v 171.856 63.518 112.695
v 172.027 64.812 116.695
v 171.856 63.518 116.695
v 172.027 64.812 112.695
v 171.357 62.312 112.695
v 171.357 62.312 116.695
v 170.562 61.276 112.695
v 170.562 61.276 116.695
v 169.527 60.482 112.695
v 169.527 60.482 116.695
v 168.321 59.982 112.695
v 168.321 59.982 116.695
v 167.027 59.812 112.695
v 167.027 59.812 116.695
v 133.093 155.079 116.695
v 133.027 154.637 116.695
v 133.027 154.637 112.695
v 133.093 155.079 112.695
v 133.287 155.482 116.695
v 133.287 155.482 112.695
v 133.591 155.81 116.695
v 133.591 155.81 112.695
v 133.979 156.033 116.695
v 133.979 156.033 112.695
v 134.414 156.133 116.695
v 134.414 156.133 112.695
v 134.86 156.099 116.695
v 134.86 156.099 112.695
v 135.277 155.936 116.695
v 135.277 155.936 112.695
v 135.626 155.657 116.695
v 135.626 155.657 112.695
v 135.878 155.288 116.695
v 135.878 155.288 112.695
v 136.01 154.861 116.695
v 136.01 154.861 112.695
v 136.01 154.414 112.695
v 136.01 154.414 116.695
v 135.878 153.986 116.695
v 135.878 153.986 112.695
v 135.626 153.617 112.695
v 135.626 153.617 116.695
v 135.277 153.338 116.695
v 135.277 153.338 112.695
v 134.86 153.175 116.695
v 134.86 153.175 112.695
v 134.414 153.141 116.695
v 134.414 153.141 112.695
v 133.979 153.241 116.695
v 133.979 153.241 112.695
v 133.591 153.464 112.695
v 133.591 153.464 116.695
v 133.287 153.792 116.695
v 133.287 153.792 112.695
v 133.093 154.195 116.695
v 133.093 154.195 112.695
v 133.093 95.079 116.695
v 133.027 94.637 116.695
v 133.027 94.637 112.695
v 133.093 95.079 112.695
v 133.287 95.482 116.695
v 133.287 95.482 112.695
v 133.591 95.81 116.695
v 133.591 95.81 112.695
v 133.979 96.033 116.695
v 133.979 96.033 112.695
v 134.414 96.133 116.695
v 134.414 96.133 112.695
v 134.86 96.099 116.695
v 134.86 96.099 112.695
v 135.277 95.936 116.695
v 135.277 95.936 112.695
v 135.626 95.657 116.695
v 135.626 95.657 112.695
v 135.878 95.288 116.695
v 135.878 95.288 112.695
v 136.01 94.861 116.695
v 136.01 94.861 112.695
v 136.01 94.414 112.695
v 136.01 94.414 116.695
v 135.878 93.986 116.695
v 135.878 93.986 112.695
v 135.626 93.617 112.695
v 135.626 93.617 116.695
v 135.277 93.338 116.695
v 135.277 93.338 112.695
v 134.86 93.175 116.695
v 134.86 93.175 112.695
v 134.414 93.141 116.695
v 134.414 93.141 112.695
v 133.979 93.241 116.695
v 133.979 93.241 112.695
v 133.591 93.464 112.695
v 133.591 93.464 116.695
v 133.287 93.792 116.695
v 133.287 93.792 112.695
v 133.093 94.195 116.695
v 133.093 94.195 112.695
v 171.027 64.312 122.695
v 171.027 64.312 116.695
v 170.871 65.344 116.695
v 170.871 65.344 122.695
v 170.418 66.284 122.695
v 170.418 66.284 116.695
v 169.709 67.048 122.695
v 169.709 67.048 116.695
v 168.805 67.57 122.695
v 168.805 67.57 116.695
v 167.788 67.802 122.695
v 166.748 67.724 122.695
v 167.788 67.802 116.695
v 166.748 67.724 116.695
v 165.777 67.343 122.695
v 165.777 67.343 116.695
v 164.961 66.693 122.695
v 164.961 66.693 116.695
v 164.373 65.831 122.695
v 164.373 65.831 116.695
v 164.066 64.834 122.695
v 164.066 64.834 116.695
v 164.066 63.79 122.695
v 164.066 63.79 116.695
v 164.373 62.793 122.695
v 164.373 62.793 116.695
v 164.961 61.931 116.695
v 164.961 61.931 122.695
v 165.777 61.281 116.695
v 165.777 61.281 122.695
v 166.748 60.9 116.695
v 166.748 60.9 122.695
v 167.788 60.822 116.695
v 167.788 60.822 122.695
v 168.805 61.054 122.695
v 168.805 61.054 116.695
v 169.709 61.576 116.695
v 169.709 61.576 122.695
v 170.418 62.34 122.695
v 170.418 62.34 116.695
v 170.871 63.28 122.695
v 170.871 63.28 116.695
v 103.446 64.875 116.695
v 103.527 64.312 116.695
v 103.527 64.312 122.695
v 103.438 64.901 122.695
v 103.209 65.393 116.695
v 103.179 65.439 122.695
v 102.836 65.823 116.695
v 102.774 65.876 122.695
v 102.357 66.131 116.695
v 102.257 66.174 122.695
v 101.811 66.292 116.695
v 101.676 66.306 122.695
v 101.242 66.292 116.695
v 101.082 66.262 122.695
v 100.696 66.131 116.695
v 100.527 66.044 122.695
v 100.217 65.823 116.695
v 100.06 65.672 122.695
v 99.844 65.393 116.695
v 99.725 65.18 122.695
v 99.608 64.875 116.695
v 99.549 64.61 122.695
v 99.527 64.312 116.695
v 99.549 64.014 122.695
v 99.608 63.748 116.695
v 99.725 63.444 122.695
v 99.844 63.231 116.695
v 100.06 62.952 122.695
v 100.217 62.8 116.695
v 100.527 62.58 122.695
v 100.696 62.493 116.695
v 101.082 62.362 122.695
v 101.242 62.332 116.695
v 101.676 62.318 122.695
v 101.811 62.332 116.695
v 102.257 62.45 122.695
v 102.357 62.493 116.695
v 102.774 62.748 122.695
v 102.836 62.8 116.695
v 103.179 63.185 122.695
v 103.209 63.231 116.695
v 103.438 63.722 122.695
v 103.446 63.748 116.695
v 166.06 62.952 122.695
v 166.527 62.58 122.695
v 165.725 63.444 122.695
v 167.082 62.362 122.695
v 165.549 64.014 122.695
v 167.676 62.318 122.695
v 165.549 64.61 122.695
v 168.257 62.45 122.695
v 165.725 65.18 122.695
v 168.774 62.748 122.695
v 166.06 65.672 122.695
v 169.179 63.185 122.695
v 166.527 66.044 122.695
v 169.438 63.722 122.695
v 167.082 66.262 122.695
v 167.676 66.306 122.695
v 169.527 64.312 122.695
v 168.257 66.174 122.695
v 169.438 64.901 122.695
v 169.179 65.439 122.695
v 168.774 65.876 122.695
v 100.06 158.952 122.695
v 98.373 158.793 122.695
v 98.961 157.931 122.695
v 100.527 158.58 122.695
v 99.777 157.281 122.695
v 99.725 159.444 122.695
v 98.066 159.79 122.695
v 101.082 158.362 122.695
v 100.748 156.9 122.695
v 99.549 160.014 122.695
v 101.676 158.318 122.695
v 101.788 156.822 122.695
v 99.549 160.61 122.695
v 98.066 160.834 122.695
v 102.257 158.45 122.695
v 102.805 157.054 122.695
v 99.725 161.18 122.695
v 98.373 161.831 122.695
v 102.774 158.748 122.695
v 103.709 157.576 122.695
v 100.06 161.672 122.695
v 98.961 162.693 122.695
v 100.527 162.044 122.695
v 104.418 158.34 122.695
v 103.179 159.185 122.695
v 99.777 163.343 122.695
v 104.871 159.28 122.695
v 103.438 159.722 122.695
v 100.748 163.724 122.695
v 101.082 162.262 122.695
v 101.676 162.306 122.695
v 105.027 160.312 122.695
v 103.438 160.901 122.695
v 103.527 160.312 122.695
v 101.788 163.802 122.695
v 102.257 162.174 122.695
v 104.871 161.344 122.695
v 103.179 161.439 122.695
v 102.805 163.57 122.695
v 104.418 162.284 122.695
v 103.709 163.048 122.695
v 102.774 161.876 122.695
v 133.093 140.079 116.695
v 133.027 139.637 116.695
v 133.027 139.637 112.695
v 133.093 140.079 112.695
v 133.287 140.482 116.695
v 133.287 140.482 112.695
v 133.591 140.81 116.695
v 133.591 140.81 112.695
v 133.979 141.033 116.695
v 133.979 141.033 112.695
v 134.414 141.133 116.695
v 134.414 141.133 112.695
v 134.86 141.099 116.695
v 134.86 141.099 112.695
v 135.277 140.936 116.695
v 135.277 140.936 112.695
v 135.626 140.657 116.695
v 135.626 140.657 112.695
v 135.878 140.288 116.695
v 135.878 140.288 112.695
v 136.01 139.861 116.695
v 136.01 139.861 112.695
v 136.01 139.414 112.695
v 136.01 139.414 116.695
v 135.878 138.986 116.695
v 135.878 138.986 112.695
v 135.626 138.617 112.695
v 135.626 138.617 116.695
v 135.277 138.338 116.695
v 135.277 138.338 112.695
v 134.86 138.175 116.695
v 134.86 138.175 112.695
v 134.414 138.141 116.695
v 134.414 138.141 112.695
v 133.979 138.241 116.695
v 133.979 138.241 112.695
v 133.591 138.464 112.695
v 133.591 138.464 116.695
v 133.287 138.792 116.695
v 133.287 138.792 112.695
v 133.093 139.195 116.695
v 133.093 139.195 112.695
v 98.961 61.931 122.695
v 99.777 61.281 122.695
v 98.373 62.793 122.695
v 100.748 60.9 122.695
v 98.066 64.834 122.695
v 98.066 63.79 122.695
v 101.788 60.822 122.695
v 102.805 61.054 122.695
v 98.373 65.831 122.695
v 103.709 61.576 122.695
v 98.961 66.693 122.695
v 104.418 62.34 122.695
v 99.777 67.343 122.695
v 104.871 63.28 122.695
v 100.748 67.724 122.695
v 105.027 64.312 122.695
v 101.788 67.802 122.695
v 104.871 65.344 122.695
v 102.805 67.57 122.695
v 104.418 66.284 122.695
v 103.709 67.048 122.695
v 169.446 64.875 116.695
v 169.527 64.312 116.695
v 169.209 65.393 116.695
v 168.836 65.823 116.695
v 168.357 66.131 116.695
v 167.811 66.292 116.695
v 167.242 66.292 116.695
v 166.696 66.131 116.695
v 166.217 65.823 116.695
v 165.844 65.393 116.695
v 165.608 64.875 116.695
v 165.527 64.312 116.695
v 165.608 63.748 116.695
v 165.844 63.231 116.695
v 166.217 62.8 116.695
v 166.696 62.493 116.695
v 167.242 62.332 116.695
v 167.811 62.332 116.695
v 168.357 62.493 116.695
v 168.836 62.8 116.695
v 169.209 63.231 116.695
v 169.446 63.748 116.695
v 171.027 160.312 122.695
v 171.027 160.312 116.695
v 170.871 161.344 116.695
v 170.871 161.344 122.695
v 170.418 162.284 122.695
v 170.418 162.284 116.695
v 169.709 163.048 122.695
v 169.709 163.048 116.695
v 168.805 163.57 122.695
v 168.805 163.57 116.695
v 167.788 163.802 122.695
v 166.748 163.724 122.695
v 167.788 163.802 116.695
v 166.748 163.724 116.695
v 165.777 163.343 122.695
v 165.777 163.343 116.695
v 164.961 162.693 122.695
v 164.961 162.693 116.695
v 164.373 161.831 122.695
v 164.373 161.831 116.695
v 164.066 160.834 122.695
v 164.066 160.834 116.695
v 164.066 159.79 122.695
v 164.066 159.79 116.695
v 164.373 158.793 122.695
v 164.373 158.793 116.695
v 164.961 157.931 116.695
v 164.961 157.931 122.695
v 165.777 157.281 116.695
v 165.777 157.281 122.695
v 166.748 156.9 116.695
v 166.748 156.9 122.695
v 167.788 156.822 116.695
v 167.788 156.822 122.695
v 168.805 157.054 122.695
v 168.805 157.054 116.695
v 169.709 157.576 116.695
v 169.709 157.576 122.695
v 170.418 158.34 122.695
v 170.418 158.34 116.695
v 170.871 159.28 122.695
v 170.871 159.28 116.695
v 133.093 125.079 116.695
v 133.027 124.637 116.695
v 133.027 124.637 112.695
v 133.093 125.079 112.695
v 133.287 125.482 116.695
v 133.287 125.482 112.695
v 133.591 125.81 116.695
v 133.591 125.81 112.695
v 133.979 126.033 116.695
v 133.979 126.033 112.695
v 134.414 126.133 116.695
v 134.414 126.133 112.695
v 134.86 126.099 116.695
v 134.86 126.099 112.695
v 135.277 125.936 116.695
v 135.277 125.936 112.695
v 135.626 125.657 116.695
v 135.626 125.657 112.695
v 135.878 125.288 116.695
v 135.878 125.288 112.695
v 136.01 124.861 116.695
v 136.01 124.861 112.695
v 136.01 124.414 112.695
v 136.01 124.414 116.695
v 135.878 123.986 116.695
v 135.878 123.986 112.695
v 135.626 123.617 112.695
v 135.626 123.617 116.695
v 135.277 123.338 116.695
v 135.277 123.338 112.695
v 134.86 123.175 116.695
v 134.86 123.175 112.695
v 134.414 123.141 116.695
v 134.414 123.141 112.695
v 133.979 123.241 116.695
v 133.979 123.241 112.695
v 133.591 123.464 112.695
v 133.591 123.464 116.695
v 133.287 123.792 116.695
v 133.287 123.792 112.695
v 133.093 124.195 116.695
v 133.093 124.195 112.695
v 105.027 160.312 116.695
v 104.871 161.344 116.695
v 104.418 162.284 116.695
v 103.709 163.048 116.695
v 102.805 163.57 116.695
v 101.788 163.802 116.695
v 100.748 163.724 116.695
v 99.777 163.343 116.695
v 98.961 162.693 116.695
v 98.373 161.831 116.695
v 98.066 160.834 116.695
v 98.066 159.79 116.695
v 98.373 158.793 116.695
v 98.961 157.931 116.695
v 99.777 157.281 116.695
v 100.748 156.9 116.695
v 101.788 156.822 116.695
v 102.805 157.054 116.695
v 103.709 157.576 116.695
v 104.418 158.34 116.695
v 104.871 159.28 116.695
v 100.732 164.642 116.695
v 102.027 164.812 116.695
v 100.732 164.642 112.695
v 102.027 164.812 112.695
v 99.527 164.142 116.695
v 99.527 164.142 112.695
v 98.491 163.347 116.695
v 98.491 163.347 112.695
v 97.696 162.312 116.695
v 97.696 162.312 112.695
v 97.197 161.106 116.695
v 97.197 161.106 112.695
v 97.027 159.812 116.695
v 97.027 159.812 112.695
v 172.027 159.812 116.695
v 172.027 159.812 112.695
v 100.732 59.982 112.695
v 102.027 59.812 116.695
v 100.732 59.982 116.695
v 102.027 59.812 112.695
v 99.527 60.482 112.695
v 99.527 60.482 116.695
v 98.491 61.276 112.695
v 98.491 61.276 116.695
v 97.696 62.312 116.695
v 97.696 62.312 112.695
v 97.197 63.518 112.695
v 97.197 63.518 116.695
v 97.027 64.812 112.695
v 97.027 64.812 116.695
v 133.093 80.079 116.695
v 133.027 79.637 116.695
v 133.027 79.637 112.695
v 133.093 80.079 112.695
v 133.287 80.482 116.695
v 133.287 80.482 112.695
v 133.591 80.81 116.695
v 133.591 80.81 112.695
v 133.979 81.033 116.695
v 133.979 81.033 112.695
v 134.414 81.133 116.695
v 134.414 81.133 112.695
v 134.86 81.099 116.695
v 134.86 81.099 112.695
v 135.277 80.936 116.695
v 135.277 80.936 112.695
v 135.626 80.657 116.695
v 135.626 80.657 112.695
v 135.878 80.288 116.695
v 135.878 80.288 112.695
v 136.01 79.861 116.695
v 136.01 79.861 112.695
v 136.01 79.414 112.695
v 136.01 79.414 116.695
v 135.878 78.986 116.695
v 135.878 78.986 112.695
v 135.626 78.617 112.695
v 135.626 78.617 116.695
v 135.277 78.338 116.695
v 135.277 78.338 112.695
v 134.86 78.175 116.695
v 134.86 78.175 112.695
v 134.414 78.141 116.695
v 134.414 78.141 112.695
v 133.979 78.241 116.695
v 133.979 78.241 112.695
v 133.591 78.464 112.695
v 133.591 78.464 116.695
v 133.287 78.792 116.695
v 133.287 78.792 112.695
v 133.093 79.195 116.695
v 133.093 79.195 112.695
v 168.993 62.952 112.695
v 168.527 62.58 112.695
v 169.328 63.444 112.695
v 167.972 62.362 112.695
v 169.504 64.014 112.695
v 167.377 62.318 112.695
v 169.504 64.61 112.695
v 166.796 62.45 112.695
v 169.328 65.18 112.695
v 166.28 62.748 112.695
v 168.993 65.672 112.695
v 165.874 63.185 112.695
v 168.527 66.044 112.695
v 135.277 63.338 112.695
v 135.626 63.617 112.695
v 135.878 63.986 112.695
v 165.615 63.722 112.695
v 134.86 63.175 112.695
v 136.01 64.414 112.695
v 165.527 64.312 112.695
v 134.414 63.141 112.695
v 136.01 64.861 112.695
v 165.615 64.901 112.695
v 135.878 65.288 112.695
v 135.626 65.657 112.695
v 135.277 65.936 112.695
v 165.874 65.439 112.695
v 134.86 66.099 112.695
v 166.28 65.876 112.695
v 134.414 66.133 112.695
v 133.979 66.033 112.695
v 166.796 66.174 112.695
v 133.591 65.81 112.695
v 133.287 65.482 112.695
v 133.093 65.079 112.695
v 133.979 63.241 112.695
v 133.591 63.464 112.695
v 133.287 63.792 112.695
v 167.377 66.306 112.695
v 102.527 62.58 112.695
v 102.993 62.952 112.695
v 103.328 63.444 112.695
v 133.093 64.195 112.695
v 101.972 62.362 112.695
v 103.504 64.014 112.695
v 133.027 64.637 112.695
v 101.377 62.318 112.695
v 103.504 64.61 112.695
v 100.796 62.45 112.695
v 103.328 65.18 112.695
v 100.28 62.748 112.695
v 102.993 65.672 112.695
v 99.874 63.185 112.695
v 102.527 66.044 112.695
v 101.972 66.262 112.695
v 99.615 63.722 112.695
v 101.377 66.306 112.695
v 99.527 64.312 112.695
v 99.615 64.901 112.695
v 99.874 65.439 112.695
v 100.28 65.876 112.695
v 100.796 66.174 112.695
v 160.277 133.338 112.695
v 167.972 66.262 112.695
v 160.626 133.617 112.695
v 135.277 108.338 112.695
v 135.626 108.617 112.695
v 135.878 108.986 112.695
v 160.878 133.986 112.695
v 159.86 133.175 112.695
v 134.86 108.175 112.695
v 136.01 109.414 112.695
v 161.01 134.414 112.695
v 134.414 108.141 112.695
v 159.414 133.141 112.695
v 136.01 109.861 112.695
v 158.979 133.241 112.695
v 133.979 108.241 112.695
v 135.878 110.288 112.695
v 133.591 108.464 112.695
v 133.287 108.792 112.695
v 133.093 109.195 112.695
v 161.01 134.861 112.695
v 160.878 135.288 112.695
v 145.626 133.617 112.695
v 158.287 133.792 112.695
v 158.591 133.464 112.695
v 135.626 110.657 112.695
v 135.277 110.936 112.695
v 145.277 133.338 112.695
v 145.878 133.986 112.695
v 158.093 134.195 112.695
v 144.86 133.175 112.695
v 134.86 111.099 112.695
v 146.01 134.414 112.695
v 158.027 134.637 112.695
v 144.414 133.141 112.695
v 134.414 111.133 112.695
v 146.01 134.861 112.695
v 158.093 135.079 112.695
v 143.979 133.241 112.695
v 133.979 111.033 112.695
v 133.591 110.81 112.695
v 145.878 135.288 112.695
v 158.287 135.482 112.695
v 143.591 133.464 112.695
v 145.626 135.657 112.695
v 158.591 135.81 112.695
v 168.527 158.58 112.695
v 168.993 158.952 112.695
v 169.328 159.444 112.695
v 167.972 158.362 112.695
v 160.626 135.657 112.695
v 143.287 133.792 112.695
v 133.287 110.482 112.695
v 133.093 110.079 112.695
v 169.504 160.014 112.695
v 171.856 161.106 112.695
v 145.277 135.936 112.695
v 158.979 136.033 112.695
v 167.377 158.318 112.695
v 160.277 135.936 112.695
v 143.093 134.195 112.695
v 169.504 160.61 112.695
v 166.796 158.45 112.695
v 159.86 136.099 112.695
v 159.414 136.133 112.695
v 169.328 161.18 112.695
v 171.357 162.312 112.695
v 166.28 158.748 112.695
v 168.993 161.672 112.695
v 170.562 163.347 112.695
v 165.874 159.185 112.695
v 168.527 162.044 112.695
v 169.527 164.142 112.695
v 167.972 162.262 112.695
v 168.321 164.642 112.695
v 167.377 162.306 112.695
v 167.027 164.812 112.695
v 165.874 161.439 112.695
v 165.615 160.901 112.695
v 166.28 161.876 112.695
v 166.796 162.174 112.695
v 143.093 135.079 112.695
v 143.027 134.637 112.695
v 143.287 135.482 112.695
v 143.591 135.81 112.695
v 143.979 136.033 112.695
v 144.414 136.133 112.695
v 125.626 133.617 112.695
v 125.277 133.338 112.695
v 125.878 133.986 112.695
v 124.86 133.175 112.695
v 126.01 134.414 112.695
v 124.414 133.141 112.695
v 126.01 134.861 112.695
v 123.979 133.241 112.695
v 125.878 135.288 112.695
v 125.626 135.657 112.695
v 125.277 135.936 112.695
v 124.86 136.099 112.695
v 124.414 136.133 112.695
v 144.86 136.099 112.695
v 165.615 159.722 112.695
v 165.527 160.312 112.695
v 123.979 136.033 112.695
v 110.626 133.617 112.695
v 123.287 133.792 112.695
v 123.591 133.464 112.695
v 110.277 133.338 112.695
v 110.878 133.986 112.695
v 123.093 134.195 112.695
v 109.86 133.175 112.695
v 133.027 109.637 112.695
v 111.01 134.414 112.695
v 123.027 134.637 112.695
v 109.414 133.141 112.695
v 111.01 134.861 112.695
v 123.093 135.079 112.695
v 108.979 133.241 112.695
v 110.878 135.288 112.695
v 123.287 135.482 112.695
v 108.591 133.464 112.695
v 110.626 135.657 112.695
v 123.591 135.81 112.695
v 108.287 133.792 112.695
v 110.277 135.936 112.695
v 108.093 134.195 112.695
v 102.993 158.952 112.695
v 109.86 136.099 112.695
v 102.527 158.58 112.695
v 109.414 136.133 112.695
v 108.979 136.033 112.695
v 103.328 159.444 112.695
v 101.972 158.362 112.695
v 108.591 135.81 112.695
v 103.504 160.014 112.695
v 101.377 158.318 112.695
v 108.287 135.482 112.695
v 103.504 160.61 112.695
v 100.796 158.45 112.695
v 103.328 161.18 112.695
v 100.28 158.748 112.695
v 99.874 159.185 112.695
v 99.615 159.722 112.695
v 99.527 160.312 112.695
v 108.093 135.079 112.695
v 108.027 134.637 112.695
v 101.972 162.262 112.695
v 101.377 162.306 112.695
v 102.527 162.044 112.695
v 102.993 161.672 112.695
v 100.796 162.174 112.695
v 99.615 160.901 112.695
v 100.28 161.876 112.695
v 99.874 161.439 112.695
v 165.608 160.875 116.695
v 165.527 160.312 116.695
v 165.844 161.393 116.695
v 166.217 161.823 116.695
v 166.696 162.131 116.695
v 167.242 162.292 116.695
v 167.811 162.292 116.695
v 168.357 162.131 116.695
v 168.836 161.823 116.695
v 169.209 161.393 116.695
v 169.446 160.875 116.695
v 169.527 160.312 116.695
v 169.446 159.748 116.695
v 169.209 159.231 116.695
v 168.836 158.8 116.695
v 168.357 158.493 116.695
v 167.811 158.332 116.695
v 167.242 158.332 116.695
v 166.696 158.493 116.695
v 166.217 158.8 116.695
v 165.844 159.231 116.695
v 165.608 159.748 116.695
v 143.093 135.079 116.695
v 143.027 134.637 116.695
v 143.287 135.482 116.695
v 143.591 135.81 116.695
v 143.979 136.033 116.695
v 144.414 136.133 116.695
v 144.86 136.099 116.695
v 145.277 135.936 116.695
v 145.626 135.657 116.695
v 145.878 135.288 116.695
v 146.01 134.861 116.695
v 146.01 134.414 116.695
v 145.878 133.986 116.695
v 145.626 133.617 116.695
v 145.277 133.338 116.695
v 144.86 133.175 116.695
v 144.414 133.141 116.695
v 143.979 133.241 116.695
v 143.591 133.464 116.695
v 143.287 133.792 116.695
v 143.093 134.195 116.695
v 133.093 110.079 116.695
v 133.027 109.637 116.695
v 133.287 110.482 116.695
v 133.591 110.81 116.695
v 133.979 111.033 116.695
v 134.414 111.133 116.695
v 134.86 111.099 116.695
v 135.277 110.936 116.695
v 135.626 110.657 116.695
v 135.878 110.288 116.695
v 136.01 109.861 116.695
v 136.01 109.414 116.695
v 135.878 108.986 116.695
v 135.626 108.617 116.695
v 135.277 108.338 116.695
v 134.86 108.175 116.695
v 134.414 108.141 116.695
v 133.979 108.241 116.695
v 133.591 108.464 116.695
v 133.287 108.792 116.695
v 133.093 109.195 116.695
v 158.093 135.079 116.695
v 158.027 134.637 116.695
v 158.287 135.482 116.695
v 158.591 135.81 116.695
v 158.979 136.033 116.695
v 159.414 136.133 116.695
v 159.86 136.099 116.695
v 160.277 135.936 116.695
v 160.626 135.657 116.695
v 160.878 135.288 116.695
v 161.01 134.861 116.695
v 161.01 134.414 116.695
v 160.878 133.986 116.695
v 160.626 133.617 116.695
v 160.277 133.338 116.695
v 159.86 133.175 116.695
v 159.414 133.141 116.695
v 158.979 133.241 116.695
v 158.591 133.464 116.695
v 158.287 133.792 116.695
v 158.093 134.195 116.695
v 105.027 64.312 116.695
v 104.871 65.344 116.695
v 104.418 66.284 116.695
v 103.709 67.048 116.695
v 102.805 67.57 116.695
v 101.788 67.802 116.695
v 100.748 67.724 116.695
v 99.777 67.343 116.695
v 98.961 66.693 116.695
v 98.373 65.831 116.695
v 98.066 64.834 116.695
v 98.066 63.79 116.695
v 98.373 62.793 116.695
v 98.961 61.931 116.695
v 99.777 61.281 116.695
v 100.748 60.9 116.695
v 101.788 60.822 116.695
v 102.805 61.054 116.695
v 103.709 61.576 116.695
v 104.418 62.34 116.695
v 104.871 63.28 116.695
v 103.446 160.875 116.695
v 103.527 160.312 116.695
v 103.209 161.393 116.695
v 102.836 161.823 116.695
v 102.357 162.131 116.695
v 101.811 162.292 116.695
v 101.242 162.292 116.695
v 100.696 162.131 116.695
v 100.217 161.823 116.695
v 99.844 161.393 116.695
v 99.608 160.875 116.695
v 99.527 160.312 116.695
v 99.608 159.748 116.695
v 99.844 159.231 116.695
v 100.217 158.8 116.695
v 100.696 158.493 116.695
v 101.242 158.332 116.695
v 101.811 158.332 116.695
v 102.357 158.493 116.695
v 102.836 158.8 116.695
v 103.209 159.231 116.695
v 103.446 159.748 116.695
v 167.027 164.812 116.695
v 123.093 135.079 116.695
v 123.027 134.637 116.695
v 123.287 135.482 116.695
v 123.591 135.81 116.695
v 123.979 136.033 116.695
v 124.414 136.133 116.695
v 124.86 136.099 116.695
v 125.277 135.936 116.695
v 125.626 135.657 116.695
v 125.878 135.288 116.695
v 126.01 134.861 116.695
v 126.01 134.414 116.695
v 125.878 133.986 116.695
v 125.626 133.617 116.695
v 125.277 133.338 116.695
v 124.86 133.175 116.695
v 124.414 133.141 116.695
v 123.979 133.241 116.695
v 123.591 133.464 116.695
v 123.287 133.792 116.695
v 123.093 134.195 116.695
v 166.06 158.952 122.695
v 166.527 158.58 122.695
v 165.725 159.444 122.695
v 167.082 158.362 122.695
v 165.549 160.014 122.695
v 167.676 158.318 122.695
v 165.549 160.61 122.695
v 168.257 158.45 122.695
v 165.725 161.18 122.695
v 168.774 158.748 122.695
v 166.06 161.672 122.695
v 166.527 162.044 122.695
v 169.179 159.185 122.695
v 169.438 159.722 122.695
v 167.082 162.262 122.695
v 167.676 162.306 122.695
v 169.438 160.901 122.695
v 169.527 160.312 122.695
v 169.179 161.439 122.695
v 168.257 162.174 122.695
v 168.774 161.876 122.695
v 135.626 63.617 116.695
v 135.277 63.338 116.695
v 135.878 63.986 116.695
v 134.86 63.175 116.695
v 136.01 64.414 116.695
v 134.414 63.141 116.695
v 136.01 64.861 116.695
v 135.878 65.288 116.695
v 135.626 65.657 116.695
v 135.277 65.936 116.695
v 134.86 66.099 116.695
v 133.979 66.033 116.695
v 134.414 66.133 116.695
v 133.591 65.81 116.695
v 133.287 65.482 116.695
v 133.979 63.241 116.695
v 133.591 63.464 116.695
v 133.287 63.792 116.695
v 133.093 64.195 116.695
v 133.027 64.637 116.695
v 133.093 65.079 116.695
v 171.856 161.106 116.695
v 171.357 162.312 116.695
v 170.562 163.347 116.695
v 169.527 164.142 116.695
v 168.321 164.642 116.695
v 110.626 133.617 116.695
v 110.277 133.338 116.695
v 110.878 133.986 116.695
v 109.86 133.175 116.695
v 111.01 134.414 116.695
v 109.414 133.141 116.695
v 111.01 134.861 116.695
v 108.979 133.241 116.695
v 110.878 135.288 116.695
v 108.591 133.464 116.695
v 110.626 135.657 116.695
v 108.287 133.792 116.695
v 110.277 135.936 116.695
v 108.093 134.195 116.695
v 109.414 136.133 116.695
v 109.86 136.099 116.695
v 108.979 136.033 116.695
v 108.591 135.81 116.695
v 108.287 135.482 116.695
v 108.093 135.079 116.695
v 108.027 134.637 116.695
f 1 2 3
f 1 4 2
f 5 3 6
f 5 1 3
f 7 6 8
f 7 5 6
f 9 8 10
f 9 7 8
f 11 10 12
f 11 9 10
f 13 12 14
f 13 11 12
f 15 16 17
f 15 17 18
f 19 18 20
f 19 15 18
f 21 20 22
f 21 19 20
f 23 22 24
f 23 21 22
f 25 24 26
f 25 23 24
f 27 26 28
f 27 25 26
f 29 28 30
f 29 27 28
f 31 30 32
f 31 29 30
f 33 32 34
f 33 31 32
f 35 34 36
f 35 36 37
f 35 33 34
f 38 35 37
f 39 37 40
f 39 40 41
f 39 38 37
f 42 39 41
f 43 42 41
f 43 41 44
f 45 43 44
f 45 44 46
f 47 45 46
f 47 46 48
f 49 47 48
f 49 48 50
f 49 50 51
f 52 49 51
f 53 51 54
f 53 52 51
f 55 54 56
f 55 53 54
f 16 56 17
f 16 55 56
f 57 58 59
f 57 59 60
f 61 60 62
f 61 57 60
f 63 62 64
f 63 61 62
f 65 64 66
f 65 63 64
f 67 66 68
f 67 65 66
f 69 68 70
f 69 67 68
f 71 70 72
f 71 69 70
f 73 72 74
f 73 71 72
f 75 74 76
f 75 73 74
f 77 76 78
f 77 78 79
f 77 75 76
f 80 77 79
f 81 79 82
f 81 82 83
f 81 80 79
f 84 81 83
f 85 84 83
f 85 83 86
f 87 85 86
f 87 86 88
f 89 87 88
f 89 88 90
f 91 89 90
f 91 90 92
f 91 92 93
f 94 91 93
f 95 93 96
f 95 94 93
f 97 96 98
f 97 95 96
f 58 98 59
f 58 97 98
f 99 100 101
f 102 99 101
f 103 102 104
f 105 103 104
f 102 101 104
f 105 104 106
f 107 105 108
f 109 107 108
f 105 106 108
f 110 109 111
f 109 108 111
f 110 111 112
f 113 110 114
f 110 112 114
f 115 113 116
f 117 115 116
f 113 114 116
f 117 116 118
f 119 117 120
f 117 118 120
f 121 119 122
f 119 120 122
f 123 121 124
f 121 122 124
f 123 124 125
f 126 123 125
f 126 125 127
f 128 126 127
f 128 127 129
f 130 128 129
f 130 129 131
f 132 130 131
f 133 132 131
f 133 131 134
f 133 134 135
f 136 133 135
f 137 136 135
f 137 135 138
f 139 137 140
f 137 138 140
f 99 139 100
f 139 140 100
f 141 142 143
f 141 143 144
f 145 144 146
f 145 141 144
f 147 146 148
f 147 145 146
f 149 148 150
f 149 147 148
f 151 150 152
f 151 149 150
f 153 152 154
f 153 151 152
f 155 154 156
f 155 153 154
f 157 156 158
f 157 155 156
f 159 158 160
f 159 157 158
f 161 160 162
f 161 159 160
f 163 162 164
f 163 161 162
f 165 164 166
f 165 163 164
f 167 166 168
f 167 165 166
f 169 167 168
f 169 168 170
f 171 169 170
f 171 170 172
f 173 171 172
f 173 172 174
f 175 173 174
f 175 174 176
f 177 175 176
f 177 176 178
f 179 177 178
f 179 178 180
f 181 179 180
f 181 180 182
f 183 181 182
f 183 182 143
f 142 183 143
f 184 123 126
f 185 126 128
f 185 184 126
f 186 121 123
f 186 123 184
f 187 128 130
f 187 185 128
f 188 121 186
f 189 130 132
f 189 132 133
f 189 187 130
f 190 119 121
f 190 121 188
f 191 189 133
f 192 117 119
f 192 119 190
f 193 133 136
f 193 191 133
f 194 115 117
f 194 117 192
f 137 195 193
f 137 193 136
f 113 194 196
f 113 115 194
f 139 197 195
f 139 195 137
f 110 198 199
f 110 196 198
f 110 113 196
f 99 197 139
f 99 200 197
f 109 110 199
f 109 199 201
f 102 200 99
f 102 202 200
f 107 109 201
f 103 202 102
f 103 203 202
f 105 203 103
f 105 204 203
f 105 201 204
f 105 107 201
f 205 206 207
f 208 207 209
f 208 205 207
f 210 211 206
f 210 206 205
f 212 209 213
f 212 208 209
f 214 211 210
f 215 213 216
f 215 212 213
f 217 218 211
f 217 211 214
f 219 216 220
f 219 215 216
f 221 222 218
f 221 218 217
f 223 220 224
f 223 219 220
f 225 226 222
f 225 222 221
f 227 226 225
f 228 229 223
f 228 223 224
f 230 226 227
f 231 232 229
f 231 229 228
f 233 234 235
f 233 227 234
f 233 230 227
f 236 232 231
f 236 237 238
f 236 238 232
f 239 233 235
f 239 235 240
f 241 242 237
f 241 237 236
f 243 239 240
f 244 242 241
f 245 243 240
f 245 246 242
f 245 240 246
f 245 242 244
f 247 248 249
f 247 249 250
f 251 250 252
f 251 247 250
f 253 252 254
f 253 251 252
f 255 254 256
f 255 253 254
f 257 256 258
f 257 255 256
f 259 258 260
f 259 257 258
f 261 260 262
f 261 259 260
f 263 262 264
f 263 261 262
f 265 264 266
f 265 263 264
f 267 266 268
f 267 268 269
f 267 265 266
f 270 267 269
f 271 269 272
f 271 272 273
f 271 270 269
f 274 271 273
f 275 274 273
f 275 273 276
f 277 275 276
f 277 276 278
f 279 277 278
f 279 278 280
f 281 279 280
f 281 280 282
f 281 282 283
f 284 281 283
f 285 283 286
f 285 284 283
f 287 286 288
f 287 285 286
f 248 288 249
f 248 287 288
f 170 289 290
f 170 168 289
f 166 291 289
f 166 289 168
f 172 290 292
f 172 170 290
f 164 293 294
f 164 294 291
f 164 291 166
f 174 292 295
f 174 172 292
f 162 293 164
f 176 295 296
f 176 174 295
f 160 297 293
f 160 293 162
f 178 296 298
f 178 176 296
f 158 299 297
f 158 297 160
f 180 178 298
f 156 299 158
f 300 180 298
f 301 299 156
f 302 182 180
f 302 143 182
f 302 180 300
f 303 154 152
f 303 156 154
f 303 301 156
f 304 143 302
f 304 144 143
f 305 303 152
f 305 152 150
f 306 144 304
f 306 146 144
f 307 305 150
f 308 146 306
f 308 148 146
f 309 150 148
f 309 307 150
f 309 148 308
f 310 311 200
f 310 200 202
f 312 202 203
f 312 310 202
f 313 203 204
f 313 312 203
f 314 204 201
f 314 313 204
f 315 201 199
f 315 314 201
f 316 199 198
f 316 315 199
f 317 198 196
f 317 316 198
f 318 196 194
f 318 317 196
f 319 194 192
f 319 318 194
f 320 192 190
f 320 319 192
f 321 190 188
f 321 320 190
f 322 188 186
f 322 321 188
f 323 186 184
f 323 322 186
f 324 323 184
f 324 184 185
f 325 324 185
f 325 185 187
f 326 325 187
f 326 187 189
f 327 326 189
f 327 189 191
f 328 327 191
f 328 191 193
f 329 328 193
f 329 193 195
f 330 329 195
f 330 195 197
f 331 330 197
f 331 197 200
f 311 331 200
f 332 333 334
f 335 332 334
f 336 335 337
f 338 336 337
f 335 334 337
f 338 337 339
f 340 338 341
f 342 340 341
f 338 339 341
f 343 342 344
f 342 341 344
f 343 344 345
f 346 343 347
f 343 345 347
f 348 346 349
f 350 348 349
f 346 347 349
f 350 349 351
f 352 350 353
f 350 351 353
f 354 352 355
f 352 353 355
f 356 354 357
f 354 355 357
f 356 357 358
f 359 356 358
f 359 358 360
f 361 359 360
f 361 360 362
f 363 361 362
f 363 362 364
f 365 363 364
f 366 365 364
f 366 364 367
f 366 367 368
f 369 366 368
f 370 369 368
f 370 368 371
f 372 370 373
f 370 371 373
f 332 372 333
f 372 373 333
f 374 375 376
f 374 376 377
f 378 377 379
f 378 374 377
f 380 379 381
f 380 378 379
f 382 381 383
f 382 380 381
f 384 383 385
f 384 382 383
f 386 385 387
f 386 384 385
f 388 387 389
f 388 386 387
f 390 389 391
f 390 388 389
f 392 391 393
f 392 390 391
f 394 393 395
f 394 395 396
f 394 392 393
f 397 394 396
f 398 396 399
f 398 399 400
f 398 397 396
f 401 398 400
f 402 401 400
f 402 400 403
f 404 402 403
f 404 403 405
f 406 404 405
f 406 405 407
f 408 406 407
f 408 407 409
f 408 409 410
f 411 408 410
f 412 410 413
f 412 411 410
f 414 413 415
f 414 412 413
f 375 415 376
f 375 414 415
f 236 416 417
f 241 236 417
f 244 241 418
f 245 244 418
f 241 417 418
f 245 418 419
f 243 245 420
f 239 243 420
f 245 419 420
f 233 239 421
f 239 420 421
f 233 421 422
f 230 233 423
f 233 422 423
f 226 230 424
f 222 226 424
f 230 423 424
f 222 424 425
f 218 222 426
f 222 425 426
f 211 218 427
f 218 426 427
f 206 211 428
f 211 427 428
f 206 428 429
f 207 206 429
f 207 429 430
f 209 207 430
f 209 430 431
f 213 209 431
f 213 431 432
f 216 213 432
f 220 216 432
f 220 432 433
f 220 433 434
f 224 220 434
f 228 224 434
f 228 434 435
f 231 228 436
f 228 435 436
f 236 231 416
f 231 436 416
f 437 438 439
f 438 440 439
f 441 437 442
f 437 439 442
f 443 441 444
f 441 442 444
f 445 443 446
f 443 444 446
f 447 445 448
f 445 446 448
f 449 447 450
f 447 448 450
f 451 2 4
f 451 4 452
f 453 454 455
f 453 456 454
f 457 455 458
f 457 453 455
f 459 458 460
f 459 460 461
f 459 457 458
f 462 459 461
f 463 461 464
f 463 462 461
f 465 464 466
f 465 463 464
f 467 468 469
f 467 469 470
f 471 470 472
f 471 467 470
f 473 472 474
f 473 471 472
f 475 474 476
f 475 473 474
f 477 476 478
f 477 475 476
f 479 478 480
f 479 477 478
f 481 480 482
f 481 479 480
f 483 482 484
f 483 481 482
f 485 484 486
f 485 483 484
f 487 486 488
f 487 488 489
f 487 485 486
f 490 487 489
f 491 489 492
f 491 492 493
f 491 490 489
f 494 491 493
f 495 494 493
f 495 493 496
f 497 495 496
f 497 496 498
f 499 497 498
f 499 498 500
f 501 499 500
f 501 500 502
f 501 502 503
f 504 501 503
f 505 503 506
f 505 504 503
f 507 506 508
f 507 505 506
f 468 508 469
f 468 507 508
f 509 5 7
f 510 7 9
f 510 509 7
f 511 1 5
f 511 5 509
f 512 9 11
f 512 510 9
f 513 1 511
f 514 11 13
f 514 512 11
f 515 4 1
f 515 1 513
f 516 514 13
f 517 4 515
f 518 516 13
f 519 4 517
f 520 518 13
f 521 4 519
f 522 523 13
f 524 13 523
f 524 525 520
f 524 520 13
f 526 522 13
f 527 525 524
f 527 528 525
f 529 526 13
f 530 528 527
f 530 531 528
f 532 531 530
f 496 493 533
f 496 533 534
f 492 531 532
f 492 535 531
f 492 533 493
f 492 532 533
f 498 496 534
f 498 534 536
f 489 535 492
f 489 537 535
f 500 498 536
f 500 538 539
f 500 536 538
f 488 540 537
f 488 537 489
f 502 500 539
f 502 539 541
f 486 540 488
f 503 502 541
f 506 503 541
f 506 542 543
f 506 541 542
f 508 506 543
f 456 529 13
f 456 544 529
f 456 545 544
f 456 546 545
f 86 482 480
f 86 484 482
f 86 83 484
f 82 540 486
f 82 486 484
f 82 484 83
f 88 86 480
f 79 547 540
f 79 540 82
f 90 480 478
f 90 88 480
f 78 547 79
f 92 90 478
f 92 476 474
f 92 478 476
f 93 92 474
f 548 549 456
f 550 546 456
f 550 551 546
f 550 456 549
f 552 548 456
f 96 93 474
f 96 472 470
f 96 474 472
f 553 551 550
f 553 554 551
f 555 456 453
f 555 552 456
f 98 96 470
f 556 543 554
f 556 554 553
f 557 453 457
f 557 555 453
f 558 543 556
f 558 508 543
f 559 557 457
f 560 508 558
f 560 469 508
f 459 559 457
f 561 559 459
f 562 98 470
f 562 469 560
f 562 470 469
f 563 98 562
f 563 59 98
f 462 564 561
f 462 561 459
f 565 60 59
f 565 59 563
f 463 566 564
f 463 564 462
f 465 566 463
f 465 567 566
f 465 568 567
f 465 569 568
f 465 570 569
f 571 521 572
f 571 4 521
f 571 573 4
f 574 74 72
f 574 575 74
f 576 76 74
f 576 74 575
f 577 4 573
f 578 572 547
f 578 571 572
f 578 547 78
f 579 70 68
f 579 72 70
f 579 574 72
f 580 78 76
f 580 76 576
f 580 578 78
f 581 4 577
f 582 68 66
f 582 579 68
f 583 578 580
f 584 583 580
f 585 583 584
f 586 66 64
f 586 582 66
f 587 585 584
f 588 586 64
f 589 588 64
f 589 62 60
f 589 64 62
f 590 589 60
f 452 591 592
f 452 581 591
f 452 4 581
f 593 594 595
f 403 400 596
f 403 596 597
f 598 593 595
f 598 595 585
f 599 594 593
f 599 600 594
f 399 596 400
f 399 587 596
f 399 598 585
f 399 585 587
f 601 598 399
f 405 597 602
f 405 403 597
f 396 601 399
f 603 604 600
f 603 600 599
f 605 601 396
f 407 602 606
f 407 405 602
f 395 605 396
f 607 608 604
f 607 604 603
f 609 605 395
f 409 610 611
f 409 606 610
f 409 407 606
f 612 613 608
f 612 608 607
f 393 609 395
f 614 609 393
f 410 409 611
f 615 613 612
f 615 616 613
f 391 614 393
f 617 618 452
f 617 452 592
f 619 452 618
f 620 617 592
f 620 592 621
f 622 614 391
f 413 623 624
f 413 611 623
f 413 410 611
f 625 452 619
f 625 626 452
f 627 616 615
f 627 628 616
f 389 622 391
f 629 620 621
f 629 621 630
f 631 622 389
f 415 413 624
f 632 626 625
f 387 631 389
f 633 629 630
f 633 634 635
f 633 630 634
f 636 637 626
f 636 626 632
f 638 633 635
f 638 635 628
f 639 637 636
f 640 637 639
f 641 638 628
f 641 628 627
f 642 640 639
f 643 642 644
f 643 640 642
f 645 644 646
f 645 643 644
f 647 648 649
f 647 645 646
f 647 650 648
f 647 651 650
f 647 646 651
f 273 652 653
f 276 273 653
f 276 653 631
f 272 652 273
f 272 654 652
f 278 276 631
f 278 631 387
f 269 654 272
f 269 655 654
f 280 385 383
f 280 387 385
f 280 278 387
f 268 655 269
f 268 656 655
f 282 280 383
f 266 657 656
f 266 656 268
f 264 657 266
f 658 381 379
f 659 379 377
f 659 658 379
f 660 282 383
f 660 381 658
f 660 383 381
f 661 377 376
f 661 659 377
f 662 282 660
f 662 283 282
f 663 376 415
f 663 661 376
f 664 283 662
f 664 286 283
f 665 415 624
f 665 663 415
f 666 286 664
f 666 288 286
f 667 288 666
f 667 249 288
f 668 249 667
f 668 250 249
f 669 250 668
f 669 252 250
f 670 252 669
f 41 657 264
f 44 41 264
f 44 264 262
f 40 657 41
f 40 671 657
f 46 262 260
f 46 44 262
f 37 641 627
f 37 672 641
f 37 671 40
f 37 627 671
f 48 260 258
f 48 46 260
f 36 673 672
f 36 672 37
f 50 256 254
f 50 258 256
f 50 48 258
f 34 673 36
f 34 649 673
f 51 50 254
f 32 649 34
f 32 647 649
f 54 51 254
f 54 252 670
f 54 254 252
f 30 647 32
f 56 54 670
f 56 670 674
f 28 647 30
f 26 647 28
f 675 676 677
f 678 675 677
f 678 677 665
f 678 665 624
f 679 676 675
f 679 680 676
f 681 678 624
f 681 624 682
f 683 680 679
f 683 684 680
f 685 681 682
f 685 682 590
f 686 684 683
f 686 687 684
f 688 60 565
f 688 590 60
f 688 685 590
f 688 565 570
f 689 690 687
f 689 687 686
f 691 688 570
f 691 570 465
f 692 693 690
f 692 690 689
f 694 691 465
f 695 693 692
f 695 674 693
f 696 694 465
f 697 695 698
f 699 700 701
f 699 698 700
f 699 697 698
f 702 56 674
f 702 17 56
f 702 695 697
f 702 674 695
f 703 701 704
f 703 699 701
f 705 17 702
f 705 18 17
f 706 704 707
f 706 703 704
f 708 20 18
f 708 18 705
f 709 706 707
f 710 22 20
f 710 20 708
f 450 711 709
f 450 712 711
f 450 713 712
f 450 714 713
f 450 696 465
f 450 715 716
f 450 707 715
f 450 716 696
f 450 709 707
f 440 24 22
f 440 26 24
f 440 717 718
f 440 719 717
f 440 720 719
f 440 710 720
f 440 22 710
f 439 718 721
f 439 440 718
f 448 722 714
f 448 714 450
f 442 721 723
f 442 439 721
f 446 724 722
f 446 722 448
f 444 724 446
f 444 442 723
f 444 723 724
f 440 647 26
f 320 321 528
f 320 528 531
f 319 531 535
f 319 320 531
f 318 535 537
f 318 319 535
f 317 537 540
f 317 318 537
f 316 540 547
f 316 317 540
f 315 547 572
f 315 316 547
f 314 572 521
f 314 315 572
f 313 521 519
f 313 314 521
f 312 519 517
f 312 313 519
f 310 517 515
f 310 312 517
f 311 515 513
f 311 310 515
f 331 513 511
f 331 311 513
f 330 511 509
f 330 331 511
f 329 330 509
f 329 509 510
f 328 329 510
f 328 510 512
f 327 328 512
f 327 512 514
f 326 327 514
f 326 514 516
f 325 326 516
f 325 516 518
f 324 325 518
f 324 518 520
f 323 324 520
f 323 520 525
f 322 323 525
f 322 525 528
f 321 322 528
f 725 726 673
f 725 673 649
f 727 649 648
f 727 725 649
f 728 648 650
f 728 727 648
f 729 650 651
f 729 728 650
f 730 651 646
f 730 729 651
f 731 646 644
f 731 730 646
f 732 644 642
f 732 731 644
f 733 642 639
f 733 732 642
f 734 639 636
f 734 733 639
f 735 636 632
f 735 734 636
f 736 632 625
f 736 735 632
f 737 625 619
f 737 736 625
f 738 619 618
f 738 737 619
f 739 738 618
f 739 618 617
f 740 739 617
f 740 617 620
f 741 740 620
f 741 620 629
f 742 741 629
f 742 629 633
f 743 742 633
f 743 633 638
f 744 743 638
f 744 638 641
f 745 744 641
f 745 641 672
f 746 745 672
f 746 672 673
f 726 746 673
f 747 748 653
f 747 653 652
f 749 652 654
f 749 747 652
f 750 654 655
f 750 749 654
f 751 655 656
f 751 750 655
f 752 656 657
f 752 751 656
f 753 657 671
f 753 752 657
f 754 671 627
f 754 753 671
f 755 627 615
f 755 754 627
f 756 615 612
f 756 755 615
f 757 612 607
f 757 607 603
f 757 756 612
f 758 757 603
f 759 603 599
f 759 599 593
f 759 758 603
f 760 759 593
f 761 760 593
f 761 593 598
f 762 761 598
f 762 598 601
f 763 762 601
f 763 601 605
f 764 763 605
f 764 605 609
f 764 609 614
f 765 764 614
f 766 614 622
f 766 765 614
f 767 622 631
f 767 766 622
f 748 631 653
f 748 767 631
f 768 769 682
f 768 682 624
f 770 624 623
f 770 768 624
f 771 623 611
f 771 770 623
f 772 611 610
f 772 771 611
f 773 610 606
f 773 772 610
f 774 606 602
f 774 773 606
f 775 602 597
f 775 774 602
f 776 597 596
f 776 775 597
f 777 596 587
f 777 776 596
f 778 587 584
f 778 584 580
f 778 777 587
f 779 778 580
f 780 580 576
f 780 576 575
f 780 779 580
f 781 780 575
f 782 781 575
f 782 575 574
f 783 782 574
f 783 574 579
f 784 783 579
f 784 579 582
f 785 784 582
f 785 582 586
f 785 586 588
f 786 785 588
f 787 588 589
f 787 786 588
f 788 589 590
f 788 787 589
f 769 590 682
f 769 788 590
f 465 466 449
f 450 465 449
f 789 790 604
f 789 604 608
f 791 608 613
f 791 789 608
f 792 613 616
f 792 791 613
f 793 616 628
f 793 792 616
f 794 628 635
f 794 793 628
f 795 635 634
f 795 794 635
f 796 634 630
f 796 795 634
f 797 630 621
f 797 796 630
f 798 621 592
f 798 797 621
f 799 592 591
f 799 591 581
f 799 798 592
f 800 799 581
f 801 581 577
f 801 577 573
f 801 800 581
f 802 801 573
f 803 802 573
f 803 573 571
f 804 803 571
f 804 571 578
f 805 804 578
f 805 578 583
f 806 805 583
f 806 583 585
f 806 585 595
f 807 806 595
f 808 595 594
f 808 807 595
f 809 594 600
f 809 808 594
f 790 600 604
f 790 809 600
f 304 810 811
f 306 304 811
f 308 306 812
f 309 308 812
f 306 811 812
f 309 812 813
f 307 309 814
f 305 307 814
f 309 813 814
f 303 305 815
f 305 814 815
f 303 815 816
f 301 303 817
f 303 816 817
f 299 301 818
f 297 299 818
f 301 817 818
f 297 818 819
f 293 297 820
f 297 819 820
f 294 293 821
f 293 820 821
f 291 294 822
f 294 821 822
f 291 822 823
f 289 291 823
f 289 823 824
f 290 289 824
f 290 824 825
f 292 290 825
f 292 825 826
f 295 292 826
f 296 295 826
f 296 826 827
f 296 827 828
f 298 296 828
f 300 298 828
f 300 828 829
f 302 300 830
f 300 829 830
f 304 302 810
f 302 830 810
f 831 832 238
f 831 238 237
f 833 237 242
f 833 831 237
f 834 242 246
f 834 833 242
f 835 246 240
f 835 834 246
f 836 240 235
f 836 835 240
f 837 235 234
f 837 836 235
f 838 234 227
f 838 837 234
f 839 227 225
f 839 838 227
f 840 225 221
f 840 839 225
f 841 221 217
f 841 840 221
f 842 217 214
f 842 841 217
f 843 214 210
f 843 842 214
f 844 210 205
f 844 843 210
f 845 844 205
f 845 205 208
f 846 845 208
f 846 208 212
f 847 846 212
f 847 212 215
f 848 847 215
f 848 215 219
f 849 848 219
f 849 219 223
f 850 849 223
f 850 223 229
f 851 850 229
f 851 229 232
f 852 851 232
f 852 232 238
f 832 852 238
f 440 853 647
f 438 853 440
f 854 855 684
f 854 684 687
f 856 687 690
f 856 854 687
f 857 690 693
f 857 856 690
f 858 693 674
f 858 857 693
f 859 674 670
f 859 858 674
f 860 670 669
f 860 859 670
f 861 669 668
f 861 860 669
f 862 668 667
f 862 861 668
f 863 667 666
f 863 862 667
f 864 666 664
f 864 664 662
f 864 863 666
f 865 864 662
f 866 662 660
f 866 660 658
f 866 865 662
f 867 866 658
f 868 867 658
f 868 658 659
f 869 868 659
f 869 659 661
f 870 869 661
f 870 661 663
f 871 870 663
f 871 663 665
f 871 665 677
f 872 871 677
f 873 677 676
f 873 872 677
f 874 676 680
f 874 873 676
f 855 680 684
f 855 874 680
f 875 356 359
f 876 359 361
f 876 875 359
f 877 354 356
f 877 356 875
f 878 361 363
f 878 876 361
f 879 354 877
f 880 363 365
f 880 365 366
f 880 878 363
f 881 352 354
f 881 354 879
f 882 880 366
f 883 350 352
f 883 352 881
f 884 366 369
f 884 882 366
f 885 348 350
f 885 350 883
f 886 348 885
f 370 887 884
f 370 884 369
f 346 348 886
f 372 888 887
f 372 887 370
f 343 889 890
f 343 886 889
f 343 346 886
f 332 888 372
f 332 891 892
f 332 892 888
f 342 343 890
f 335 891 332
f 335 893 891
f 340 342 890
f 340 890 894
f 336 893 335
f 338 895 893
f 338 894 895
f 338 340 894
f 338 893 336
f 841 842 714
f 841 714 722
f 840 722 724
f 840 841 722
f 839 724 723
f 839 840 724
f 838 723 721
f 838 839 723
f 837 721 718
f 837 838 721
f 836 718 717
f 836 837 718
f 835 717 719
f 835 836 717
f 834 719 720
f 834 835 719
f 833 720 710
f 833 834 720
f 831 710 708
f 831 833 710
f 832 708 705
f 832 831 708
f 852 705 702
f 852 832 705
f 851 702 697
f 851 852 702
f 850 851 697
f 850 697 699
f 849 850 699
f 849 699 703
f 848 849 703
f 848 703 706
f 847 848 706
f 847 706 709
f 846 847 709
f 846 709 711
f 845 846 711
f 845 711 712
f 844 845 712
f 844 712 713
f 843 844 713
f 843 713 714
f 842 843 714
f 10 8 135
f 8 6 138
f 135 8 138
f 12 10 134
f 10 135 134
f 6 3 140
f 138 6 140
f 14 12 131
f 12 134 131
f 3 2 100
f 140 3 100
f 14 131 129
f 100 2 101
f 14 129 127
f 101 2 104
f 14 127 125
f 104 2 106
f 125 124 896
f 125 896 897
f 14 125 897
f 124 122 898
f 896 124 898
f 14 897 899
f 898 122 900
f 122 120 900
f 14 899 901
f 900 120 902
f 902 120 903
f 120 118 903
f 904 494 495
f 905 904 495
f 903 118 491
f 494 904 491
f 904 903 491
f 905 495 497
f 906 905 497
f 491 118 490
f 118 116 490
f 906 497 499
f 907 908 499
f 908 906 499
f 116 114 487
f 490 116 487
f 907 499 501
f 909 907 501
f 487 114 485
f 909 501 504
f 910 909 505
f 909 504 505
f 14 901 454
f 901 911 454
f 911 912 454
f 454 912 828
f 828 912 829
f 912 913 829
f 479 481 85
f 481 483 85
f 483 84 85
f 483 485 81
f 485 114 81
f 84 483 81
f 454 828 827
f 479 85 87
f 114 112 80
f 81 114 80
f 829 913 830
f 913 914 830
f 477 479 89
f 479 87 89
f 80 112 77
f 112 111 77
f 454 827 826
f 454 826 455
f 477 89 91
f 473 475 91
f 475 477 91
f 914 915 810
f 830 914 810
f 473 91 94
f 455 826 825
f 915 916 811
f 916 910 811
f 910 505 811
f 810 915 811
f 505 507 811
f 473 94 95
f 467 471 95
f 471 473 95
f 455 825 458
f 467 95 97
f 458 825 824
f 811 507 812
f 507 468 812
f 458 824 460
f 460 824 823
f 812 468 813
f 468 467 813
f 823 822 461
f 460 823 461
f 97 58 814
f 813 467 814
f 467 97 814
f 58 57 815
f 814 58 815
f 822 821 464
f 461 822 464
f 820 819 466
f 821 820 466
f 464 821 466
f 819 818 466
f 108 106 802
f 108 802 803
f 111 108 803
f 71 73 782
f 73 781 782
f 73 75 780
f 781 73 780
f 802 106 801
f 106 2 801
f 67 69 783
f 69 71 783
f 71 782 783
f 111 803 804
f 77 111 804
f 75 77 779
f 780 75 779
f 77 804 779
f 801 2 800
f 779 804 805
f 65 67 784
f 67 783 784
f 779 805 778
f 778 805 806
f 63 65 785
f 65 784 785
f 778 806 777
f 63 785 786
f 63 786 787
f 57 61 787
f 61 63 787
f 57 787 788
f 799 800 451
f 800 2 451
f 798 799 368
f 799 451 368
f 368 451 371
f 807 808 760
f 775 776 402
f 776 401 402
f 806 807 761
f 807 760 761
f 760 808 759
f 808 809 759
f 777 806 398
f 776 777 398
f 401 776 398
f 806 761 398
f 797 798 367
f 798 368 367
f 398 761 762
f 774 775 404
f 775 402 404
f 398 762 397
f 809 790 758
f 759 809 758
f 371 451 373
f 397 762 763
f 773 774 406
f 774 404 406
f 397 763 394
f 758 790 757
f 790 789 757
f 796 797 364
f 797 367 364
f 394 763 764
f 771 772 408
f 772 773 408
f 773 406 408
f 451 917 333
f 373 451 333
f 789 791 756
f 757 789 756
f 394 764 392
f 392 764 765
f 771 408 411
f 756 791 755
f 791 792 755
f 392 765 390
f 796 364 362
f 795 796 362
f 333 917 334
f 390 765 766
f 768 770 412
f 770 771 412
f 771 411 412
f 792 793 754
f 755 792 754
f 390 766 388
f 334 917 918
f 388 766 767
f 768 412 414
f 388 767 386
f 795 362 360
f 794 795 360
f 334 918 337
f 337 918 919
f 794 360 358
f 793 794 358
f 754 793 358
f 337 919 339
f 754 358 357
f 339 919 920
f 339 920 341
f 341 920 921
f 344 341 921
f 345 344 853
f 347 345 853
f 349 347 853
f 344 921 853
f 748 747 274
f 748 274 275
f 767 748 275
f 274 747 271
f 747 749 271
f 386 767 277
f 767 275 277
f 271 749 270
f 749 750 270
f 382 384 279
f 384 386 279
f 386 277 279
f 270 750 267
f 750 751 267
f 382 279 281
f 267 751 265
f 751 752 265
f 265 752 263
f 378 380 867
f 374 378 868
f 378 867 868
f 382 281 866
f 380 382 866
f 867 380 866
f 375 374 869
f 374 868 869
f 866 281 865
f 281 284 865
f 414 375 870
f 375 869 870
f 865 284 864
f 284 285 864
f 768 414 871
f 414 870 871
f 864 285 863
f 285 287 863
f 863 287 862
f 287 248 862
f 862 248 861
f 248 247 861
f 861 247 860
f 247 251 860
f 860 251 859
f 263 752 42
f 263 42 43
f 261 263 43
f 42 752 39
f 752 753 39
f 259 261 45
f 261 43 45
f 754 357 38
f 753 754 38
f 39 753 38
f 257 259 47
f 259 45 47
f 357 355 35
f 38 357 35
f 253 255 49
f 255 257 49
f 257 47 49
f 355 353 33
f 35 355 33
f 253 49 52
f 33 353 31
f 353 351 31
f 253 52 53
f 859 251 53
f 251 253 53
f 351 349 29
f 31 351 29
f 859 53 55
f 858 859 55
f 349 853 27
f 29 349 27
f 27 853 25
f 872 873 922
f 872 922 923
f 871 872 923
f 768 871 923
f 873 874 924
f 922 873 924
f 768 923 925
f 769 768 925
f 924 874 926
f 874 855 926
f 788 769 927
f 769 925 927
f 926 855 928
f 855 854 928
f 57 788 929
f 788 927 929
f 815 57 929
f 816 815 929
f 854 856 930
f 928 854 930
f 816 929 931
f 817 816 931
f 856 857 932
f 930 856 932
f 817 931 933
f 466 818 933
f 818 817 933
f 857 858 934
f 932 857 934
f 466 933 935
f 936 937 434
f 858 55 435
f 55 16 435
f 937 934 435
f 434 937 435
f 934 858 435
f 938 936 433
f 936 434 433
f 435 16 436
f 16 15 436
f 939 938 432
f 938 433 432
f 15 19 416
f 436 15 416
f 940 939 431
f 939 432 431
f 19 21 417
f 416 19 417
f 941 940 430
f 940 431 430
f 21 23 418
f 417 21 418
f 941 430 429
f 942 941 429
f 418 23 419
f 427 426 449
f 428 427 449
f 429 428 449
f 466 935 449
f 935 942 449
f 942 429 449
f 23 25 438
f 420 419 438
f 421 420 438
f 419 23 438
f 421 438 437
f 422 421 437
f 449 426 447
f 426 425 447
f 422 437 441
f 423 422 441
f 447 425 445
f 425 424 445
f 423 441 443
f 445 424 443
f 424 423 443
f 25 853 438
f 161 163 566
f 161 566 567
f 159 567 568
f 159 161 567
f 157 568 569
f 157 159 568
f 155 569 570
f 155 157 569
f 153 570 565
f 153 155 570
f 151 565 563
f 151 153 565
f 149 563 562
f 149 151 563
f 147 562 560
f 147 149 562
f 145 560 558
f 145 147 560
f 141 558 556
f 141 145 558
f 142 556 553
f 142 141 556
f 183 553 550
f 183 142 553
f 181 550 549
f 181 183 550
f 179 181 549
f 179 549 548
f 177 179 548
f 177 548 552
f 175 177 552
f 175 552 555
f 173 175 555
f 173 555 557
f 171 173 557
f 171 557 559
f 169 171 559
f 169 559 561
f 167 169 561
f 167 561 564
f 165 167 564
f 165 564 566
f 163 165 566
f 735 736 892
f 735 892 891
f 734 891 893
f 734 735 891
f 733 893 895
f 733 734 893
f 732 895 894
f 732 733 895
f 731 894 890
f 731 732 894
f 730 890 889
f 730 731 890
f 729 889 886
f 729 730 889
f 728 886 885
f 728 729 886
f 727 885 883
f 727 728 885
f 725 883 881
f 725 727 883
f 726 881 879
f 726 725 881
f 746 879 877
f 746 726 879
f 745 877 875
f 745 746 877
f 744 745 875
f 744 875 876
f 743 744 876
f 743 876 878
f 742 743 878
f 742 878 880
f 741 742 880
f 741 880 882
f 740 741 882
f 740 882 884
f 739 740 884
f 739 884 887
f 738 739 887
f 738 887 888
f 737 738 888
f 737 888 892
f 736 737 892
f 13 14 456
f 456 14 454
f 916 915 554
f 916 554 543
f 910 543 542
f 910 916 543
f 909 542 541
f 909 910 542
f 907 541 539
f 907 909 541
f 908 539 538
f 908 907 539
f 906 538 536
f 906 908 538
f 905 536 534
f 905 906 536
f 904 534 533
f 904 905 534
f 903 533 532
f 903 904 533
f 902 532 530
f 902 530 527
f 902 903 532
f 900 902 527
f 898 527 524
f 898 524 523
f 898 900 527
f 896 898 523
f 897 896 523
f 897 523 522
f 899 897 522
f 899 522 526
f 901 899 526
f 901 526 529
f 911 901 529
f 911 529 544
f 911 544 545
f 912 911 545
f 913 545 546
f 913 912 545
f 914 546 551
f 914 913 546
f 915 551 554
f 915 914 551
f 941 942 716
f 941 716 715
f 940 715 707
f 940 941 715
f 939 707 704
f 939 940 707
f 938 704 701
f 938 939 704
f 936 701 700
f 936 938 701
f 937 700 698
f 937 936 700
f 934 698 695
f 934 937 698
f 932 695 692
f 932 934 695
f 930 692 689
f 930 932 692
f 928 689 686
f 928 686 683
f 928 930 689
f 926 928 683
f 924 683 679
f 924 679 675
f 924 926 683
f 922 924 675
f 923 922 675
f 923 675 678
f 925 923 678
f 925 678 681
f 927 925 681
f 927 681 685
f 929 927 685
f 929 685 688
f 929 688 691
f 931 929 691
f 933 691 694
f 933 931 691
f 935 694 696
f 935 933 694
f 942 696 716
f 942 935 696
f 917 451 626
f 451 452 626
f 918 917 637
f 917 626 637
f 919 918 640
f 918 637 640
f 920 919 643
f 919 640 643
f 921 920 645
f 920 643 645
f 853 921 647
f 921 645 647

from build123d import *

# Parameters (mm, degrees)
SKETCH1_W           = 75
SKETCH1_H           = 105
SKETCH1_R           = 1.5
SKETCH1_R_2         = 2
BOSS_EXTRUDE1_DEPTH = 4
SKETCH2_R           = 3.5
SKETCH2_R_2         = 2
BOSS_EXTRUDE2_DEPTH = 6
FILLET1_R           = 5


with BuildPart() as part:
    # Sketch1 → Boss-Extrude1 (new body)
    with BuildSketch(Plane(origin=(0, 0, 116.694714263), x_dir=(-1, 0, 0), z_dir=(0, 0, -1))):
        with Locations((-134.526557277, 112.311918208)):
            Rectangle(SKETCH1_W, SKETCH1_H)
        with Locations((-134.526557277, 154.637085275)):
            Circle(SKETCH1_R, mode=Mode.SUBTRACT)
        with Locations((-134.526557277, 139.637085275)):
            Circle(SKETCH1_R, mode=Mode.SUBTRACT)
        with Locations((-144.526557277, 134.637085275)):
            Circle(SKETCH1_R, mode=Mode.SUBTRACT)
        with Locations((-159.526557277, 134.637085275)):
            Circle(SKETCH1_R, mode=Mode.SUBTRACT)
        with Locations((-124.526557277, 134.637085275)):
            Circle(SKETCH1_R, mode=Mode.SUBTRACT)
        with Locations((-109.526557277, 134.637085275)):
            Circle(SKETCH1_R, mode=Mode.SUBTRACT)
        with Locations((-134.526557277, 124.637085275)):
            Circle(SKETCH1_R, mode=Mode.SUBTRACT)
        with Locations((-134.526557277, 109.637085275)):
            Circle(SKETCH1_R, mode=Mode.SUBTRACT)
        with Locations((-134.526557277, 94.637085275)):
            Circle(SKETCH1_R, mode=Mode.SUBTRACT)
        with Locations((-134.526557277, 79.637085275)):
            Circle(SKETCH1_R, mode=Mode.SUBTRACT)
        with Locations((-134.526557277, 64.637085275)):
            Circle(SKETCH1_R, mode=Mode.SUBTRACT)
        with Locations((-167.526557277, 64.311918208)):
            Circle(SKETCH1_R_2, mode=Mode.SUBTRACT)
        with Locations((-101.526557277, 64.311918208)):
            Circle(SKETCH1_R_2, mode=Mode.SUBTRACT)
        with Locations((-101.526557277, 160.311918208)):
            Circle(SKETCH1_R_2, mode=Mode.SUBTRACT)
        with Locations((-167.526557277, 160.311918208)):
            Circle(SKETCH1_R_2, mode=Mode.SUBTRACT)
    extrude(amount=BOSS_EXTRUDE1_DEPTH)

    # Sketch2 → Boss-Extrude2 (add)
    with BuildSketch(Plane.XY.offset(116.694714263)):
        with Locations((101.526557277, 160.311918208)):
            Circle(SKETCH2_R)
        with Locations((101.526557277, 160.311918208)):
            Circle(SKETCH2_R_2, mode=Mode.SUBTRACT)
        with Locations((167.526557277, 160.311918208)):
            Circle(SKETCH2_R)
        with Locations((167.526557277, 160.311918208)):
            Circle(SKETCH2_R_2, mode=Mode.SUBTRACT)
        with Locations((101.526557277, 64.311918208)):
            Circle(SKETCH2_R)
        with Locations((101.526557277, 64.311918208)):
            Circle(SKETCH2_R_2, mode=Mode.SUBTRACT)
        with Locations((167.526557277, 64.311918208)):
            Circle(SKETCH2_R)
        with Locations((167.526557277, 64.311918208)):
            Circle(SKETCH2_R_2, mode=Mode.SUBTRACT)
    extrude(amount=BOSS_EXTRUDE2_DEPTH)

    # Fillet1
    fillet1_edges = [part.edges().sort_by_distance(p)[0] for p in [
        (172.026557277, 164.811918208, 114.694714263),
        (97.026557277, 164.811918208, 114.694714263),
        (97.026557277, 59.811918208, 114.694714263),
        (172.026557277, 59.811918208, 114.694714263),
    ]]
    fillet(fillet1_edges, radius=FILLET1_R)


solid = part.part
